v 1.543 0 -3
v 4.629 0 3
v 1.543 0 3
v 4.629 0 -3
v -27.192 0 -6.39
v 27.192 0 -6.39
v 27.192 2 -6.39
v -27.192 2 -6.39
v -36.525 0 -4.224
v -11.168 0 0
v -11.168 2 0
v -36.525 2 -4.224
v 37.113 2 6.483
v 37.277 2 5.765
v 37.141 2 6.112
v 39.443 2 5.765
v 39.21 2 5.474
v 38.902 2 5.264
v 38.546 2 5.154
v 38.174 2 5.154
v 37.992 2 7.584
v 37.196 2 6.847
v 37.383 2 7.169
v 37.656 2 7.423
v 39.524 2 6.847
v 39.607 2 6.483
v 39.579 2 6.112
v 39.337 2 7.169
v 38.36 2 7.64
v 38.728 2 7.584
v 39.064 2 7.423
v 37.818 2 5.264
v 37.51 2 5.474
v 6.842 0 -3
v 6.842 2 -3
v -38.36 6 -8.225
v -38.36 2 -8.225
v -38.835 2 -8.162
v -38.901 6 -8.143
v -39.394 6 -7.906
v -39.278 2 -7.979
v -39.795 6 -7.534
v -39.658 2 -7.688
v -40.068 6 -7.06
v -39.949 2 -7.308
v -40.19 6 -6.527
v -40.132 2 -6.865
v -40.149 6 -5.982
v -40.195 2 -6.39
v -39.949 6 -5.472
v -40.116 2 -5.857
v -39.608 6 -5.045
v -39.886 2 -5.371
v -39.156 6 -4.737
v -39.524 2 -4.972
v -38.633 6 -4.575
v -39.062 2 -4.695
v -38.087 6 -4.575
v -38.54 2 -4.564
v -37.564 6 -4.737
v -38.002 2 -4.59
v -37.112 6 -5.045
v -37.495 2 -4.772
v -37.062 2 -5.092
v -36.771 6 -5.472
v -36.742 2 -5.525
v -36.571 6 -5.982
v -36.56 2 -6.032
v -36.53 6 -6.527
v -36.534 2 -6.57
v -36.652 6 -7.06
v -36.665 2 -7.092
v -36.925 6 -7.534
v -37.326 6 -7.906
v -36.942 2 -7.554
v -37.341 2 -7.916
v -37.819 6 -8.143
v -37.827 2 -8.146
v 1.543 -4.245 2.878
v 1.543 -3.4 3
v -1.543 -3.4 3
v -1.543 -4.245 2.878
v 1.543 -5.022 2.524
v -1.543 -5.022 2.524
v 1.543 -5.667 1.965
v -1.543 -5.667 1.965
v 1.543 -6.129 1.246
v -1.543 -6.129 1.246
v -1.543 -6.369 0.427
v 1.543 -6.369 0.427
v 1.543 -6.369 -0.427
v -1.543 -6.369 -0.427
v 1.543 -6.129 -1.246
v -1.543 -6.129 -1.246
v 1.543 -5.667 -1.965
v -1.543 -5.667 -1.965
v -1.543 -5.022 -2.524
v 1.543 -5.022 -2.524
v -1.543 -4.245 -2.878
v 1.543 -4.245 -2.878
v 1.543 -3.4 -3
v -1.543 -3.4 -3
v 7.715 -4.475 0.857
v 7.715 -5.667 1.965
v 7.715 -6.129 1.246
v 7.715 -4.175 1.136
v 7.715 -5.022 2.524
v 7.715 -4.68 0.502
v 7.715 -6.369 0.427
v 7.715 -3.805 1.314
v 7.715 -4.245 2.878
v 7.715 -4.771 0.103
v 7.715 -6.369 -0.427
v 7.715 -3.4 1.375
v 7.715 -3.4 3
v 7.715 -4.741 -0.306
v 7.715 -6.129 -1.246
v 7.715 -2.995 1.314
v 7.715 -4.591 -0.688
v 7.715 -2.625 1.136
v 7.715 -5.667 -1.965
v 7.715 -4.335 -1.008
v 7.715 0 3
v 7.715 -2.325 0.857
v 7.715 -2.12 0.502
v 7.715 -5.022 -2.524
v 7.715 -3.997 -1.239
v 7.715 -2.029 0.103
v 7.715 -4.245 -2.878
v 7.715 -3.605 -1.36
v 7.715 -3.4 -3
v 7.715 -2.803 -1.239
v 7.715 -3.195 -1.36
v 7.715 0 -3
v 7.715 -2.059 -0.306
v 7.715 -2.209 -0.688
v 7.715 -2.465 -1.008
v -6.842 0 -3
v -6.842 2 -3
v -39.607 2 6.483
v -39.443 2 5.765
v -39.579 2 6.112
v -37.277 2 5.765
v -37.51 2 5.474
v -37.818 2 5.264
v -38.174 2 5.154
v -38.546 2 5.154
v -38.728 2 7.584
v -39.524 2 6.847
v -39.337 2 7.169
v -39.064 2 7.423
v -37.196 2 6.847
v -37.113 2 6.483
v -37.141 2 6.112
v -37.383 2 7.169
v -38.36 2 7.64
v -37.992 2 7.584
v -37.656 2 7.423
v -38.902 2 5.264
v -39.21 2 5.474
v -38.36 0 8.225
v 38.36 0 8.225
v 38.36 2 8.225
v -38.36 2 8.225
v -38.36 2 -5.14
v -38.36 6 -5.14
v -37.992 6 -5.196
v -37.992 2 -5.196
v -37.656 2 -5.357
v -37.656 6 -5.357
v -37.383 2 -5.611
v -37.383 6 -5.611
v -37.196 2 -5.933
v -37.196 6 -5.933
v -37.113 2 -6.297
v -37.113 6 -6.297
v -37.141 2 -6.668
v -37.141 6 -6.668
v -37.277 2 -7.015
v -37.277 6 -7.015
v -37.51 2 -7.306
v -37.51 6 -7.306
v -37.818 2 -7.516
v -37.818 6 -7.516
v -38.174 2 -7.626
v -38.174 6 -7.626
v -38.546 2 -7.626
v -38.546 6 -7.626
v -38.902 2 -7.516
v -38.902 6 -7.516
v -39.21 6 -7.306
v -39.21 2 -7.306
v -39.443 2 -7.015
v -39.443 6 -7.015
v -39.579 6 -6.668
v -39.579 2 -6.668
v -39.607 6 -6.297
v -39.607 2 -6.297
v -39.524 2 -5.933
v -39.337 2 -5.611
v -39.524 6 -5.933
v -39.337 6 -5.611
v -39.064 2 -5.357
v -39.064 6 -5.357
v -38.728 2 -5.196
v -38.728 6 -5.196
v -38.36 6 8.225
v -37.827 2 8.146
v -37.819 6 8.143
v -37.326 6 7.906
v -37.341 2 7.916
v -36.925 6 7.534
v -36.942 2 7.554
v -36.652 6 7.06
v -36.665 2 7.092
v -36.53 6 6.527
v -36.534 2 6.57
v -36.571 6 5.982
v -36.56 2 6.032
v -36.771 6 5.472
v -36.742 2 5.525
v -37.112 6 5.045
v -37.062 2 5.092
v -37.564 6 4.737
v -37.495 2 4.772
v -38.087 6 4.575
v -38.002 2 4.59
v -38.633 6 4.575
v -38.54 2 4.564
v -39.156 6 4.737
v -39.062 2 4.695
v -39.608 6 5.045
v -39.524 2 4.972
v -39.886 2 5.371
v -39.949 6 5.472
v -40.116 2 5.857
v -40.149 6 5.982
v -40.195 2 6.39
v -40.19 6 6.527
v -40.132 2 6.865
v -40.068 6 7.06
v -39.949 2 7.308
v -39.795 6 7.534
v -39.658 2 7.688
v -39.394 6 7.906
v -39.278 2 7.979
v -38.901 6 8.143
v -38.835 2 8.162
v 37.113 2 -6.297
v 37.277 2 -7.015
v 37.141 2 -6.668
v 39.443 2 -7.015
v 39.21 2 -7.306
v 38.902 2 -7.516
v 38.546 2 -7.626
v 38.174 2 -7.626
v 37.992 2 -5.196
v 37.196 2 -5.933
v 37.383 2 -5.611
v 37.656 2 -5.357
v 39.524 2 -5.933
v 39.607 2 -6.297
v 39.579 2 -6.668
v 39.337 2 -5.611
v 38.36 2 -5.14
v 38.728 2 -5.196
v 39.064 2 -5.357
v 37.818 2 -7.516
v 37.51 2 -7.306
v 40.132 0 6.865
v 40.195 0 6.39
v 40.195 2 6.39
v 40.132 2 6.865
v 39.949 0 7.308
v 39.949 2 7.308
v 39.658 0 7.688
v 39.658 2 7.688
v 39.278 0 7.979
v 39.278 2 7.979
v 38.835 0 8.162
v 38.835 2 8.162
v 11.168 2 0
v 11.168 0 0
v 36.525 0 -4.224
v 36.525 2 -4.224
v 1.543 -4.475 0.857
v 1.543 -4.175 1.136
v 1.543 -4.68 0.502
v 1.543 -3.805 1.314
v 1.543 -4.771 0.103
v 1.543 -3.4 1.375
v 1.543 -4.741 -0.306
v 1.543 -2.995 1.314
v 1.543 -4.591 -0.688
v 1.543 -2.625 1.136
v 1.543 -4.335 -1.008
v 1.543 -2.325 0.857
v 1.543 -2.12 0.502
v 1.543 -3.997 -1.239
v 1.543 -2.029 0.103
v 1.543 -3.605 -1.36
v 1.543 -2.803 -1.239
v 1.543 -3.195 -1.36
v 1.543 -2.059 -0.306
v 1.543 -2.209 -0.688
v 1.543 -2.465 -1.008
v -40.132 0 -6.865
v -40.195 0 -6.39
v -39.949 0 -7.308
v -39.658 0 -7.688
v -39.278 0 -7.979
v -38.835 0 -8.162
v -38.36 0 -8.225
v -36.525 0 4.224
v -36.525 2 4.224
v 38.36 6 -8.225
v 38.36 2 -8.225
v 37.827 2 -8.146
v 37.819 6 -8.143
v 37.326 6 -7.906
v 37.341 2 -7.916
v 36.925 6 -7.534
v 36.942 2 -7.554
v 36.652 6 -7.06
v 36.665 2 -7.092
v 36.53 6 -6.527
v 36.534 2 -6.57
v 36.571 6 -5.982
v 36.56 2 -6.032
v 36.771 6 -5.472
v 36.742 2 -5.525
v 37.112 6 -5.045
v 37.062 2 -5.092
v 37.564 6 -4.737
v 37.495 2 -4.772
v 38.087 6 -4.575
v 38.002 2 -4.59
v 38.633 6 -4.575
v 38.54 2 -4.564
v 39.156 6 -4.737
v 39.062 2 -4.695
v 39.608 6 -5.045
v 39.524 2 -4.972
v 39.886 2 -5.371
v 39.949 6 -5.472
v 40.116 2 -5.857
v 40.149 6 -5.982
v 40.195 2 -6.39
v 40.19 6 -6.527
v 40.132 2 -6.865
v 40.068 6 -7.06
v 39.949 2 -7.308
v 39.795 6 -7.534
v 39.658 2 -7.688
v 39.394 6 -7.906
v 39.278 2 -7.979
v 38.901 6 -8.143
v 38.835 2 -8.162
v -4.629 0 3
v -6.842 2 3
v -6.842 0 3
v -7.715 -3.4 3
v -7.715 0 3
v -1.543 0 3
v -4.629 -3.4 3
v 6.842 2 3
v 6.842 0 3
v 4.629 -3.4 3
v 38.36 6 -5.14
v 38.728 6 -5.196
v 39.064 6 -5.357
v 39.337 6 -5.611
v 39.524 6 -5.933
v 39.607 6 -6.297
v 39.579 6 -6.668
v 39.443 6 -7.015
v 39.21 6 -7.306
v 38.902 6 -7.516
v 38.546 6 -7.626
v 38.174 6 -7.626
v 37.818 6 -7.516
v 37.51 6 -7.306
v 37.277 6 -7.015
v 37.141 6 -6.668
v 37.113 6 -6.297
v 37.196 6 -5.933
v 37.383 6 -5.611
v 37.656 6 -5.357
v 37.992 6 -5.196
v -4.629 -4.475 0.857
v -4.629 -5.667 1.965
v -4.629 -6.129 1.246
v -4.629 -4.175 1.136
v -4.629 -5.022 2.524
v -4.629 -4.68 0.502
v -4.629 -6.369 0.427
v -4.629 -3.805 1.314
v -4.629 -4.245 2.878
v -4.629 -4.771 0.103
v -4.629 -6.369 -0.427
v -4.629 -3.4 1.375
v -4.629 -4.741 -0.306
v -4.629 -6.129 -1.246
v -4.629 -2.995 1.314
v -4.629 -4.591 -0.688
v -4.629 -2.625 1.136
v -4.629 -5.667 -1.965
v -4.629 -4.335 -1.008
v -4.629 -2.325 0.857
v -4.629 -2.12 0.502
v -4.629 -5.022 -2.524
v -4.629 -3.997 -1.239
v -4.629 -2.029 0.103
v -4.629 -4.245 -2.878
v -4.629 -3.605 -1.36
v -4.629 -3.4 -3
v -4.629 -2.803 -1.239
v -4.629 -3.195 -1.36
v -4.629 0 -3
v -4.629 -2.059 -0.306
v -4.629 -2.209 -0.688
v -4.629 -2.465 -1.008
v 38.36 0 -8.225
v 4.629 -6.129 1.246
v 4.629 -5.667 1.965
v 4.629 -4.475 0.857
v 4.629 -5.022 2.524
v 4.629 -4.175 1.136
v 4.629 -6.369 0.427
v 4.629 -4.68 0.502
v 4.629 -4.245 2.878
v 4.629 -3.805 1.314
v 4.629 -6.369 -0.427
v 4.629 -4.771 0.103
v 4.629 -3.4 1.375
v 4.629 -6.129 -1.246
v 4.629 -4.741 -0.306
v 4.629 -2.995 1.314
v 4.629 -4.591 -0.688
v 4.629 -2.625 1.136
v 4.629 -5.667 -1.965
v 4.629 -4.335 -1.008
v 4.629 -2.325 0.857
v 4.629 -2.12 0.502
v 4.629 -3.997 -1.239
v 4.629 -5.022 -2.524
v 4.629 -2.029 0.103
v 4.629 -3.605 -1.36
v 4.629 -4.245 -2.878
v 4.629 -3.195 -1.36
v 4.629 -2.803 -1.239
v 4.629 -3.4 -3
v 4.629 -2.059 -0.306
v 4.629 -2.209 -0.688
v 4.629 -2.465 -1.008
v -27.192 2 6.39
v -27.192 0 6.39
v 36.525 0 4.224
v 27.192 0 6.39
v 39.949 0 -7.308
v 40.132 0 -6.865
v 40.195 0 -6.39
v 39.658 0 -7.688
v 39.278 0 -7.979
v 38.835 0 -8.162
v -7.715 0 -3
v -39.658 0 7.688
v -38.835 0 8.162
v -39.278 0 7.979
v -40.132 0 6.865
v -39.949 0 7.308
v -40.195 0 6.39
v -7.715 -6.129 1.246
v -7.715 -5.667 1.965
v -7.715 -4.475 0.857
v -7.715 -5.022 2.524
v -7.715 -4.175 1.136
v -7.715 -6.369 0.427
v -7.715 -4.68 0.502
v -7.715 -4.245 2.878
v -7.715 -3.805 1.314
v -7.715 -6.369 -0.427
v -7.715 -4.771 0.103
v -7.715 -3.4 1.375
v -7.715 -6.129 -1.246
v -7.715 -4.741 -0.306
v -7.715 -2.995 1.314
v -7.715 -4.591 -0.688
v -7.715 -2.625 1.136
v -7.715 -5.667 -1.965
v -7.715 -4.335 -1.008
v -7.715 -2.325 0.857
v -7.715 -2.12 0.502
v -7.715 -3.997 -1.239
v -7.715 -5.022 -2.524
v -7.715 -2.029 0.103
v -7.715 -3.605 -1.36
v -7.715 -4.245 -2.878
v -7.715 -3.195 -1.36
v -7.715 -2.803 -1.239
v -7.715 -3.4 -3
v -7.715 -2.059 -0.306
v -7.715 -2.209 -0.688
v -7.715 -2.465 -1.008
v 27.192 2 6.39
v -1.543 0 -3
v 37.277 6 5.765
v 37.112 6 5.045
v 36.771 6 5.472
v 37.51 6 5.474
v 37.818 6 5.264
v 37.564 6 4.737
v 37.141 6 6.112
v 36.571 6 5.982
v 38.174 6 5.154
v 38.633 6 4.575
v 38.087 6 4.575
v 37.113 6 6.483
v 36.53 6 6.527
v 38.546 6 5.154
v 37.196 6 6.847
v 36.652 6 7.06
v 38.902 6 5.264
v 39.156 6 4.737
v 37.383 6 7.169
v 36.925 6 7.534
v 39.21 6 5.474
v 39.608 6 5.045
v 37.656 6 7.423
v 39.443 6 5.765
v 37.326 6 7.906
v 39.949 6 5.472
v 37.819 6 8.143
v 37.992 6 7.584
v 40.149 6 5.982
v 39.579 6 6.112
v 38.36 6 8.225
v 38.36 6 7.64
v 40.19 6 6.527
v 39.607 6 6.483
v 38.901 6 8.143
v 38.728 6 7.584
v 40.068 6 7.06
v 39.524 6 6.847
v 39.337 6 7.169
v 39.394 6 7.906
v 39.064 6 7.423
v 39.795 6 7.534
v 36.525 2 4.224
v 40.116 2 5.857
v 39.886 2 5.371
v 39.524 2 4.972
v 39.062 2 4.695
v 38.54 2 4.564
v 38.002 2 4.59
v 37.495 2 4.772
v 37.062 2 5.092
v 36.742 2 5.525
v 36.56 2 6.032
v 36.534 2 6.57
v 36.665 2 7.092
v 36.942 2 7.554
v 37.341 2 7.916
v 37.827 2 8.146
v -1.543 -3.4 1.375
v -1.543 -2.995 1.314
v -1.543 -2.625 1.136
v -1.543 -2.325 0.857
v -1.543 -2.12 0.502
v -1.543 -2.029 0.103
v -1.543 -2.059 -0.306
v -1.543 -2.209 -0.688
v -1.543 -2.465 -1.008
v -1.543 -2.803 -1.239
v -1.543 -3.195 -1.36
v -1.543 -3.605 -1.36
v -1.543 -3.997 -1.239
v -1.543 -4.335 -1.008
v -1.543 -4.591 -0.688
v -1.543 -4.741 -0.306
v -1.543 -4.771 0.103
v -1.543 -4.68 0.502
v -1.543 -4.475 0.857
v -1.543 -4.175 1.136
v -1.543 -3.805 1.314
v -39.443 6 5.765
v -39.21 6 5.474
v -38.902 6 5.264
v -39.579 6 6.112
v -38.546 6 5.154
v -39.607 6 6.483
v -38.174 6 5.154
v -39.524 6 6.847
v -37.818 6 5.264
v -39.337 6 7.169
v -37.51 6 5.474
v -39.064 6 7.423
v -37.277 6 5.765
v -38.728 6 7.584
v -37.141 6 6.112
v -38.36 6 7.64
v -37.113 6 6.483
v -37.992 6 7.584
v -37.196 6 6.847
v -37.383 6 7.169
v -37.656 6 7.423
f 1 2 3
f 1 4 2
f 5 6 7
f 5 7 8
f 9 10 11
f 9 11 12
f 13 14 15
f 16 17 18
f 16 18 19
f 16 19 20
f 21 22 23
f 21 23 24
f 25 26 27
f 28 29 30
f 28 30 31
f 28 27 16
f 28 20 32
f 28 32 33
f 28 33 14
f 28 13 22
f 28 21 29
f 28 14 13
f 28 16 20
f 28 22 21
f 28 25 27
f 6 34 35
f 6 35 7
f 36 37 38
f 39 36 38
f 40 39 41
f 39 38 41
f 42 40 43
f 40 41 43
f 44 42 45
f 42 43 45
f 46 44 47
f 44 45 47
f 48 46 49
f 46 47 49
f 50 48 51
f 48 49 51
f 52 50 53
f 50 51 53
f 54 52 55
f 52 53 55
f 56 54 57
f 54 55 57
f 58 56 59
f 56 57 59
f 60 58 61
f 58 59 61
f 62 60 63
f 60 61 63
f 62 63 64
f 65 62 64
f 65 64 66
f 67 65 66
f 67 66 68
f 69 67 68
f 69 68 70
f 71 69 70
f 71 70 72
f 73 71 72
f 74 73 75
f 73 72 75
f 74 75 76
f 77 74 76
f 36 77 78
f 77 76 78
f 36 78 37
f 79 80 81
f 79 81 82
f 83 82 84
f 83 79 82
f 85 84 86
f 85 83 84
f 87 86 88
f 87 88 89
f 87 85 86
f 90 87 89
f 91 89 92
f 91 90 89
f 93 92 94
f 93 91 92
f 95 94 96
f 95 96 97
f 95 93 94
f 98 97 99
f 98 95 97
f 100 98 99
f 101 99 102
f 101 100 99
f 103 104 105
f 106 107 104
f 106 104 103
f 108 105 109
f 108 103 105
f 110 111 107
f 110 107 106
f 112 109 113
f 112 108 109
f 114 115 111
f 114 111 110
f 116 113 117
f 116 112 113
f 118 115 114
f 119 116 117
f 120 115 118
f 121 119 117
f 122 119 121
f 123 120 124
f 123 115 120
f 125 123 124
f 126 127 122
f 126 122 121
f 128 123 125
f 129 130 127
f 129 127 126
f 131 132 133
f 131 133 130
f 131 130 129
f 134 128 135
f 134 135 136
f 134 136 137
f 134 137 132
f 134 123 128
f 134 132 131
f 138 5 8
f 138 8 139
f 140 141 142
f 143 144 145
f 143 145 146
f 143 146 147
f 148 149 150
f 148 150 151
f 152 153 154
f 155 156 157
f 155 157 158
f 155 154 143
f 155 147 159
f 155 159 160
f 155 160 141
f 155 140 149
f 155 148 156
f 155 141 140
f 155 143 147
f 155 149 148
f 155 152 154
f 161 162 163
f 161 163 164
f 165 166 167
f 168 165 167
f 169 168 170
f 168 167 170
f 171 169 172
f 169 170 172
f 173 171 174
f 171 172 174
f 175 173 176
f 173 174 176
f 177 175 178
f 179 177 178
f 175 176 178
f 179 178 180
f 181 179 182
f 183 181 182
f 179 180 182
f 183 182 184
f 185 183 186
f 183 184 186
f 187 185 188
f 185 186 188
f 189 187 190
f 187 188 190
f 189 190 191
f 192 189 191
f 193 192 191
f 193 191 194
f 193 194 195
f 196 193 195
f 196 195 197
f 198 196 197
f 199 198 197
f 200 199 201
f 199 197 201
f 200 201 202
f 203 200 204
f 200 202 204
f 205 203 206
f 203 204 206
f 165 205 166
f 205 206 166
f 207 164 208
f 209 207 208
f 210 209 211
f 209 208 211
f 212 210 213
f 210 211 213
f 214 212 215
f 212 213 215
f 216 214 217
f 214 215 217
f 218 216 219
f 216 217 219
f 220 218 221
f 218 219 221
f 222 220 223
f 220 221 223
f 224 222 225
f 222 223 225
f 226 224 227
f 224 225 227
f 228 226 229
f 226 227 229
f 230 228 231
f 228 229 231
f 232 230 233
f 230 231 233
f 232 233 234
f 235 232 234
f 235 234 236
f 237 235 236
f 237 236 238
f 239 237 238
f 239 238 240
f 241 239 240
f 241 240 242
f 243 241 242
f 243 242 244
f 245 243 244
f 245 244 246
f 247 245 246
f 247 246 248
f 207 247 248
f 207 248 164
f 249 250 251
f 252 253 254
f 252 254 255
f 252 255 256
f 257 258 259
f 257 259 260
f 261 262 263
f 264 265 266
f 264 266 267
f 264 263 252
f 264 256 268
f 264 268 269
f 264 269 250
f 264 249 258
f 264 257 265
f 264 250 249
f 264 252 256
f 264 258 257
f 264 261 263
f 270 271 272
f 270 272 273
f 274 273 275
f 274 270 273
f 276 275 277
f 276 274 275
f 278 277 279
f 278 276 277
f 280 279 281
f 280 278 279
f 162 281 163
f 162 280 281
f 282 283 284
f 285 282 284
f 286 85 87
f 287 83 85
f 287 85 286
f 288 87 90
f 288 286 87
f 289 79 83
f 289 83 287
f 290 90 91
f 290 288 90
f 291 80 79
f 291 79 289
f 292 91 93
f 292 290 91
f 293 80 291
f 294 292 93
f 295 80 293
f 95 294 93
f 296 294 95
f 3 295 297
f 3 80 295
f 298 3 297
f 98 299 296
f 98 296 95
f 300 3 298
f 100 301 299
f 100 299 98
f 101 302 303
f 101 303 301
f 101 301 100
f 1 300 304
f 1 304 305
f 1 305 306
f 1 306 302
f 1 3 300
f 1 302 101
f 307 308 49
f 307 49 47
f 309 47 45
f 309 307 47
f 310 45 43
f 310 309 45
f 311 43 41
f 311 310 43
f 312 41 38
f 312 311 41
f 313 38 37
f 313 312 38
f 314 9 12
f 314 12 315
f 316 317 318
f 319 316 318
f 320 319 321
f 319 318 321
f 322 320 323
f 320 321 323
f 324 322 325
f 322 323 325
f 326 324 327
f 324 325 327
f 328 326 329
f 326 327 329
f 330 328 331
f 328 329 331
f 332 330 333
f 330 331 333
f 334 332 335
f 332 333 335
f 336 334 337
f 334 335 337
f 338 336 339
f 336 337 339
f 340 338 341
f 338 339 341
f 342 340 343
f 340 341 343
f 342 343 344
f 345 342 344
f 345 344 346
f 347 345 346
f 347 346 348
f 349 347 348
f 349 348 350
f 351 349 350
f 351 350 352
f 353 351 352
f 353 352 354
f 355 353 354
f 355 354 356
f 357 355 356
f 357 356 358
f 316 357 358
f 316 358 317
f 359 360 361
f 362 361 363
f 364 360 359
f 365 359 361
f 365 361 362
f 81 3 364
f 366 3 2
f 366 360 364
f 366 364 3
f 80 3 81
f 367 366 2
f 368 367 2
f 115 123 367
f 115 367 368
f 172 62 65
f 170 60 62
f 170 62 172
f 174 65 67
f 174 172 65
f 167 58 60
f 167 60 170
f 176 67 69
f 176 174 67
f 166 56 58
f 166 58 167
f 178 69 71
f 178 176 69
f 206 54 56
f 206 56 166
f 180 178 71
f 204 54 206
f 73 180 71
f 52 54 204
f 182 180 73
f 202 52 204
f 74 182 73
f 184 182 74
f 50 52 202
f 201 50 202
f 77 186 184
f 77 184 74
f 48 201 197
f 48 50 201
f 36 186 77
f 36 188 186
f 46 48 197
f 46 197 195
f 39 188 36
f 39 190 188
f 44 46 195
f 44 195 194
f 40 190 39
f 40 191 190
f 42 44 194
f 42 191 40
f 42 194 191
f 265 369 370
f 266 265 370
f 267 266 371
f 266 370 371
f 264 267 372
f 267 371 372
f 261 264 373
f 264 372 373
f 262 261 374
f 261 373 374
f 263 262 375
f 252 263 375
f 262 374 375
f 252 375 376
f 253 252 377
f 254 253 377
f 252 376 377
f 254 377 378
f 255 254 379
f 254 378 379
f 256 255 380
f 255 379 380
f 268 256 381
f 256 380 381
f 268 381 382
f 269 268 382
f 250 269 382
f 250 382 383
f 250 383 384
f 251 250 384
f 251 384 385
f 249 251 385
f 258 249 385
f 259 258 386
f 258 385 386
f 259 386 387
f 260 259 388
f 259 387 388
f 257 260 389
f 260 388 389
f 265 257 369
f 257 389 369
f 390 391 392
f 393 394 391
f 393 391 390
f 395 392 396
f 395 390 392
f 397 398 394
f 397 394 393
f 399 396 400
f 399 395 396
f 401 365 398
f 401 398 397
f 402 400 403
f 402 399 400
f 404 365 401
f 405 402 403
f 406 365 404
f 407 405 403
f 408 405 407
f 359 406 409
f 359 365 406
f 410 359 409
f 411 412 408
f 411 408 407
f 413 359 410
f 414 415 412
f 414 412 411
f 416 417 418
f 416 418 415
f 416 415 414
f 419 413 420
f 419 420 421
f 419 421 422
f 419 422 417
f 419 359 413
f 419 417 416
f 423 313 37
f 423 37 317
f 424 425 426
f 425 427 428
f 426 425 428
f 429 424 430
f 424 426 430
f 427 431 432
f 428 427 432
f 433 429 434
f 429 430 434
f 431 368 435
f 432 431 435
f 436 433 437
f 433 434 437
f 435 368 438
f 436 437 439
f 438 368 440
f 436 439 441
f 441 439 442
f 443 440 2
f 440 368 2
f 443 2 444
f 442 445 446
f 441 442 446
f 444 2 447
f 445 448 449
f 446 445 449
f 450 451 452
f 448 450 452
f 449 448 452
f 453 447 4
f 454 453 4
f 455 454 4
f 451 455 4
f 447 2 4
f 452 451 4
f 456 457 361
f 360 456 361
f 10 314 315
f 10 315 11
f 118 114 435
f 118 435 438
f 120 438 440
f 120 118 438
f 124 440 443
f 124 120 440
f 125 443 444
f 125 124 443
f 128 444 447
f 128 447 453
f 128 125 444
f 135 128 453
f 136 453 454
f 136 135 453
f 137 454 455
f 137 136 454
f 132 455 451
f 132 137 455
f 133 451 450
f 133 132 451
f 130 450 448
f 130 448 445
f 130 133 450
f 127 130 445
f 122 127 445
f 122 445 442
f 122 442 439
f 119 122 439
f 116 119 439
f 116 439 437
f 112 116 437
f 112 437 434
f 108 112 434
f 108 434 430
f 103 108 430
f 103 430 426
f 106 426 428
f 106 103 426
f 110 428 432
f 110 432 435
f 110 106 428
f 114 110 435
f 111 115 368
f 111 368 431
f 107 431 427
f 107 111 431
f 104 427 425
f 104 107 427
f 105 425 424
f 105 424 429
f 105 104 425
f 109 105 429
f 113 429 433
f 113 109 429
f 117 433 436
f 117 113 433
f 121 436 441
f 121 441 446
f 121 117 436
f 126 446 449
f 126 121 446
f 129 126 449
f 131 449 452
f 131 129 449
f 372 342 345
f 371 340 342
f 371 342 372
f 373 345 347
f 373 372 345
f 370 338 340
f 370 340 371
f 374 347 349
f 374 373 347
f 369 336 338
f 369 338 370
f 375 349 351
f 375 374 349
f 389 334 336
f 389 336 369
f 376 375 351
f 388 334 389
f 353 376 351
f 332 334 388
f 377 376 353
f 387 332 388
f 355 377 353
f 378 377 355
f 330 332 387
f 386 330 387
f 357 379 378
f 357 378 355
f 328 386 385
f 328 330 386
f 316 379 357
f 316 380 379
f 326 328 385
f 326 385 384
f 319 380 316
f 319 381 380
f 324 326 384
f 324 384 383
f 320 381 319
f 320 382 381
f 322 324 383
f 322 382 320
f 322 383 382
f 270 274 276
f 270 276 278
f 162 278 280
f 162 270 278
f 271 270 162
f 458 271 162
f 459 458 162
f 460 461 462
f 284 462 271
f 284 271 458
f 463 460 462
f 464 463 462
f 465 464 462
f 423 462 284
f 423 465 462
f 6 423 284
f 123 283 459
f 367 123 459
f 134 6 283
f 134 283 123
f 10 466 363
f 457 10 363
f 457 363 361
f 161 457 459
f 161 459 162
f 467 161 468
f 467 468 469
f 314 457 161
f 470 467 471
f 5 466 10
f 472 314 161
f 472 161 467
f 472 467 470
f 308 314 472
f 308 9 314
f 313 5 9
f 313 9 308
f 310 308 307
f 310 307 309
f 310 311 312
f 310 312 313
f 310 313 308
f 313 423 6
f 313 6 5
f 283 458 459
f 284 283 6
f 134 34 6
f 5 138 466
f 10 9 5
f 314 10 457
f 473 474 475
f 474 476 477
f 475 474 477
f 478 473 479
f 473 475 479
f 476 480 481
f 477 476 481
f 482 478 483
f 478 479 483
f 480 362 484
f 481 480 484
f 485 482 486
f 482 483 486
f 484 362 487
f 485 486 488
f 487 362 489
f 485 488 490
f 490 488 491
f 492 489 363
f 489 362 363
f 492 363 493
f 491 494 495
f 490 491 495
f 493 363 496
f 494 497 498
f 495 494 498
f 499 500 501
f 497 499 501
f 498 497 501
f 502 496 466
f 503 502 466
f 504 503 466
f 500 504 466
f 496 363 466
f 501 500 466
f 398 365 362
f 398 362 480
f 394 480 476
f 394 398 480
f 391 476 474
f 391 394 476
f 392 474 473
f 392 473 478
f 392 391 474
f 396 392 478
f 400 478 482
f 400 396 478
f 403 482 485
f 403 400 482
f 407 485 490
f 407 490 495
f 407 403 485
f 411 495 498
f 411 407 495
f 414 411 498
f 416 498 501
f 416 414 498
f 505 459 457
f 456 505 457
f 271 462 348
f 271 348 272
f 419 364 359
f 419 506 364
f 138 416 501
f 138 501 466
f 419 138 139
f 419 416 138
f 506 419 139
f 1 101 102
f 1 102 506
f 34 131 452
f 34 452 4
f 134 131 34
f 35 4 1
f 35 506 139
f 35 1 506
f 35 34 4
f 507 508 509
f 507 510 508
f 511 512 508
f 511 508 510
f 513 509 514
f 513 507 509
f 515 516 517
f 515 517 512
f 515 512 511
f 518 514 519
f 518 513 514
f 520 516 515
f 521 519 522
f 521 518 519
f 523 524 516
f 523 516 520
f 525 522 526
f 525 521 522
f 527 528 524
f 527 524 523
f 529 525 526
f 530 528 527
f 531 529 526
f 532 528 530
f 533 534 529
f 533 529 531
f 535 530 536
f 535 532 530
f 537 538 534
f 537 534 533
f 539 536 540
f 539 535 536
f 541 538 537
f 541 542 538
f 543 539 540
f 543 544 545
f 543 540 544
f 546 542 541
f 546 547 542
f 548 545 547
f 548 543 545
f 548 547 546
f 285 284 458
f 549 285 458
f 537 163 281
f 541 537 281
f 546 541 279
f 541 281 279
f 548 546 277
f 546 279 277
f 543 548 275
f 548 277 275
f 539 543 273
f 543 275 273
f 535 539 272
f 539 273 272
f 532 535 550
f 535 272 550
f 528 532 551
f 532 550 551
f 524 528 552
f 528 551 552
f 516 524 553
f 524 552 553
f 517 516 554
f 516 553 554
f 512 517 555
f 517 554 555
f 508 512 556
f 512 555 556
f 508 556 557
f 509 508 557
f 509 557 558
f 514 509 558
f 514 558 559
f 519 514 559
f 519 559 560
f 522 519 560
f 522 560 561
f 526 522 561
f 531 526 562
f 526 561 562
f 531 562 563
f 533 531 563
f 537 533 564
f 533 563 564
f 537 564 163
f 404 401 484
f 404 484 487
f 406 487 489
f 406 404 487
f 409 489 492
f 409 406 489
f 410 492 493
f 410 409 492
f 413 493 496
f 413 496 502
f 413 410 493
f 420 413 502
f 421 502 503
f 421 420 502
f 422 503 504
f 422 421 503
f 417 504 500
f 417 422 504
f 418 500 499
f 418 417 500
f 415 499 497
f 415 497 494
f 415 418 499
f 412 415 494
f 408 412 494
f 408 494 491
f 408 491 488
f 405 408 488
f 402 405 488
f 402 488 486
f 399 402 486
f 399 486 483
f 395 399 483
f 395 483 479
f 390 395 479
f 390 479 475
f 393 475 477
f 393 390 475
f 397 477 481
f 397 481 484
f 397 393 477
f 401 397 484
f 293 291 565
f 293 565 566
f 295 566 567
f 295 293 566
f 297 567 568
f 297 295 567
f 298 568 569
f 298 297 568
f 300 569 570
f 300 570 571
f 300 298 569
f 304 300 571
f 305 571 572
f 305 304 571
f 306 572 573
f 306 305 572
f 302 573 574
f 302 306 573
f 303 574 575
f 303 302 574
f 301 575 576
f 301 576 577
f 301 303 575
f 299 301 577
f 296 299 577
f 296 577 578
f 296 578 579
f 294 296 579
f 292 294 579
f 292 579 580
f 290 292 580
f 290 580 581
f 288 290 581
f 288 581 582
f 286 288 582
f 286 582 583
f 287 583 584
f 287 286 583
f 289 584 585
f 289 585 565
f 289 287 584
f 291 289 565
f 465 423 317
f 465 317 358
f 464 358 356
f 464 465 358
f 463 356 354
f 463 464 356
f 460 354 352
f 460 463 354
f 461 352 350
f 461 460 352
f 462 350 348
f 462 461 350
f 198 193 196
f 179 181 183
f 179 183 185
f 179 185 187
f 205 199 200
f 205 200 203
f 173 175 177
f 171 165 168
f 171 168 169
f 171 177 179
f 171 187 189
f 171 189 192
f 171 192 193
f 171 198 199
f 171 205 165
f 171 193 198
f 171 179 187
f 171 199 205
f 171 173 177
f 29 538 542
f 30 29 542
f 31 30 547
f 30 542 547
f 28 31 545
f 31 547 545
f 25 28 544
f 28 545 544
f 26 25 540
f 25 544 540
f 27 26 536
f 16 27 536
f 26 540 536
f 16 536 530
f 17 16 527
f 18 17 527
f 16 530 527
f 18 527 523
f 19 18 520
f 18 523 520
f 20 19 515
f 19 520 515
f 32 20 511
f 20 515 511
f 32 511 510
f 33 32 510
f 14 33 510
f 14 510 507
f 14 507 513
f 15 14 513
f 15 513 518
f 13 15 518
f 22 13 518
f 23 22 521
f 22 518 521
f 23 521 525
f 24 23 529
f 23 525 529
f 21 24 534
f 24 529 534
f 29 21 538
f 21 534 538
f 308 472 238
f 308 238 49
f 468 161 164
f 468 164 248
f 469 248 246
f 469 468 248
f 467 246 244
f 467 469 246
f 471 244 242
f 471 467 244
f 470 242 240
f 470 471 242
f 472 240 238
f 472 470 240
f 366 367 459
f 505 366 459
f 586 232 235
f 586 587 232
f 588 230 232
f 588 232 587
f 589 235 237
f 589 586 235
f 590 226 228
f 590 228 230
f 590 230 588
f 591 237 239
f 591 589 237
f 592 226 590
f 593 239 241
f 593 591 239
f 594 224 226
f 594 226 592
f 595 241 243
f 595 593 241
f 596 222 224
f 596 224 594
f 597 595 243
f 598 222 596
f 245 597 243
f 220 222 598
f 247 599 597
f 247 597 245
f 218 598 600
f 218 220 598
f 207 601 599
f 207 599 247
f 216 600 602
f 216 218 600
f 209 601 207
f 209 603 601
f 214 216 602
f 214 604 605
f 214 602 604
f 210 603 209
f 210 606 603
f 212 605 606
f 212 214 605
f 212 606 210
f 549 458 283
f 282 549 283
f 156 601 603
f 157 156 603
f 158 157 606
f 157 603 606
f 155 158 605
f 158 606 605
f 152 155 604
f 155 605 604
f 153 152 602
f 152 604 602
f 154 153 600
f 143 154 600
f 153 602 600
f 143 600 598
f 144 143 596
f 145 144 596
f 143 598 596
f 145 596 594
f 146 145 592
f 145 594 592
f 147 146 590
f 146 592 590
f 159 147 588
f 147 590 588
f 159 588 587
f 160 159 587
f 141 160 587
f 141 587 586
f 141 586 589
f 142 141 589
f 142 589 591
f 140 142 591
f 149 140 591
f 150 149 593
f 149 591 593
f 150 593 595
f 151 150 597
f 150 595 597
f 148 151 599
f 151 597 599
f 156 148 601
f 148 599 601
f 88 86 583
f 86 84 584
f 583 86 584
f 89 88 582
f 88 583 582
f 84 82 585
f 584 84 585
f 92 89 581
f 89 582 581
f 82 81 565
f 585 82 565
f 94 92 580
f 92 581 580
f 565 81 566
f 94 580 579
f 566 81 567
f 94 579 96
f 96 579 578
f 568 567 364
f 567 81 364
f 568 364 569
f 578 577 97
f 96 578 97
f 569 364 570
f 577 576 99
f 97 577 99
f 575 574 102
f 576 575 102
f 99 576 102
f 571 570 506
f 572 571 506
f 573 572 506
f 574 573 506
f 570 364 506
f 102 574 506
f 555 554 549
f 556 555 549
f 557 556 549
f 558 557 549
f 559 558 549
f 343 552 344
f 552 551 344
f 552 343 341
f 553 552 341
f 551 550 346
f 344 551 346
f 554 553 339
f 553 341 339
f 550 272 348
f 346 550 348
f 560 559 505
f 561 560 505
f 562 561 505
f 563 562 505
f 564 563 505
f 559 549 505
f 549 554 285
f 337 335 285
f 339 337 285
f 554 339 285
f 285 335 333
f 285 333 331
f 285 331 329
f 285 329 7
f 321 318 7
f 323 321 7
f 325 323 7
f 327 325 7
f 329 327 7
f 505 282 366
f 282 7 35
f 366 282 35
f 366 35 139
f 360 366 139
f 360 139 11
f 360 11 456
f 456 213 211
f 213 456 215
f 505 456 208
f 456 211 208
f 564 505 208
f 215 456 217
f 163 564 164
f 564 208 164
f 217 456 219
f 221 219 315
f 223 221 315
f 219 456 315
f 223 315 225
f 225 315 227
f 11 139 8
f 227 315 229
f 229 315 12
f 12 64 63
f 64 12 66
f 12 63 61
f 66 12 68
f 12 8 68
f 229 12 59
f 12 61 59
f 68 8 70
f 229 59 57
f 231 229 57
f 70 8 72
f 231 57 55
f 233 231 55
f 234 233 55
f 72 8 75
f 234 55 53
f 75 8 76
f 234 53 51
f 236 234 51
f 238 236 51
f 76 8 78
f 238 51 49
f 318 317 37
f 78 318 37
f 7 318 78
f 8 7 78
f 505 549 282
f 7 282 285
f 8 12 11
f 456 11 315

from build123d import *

# Parameters (mm, degrees)
BOSS_EXTRUDE2_DEPTH = 2
SKETCH4_R           = 1.835
BOSS_EXTRUDE3_DEPTH = 4
SKETCH6_R           = 1.25
CUT_EXTRUDE1_DEPTH  = 4
SKETCH7_R           = 1.375
BOSS_EXTRUDE4_DEPTH = 3.086
LPATTERN1_COUNT     = 3
LPATTERN1_PITCH     = 6.172


with BuildPart() as part:
    # Sketch3 → Boss-Extrude2 (new body)
    with BuildSketch(Plane(origin=(0, 0, 0), x_dir=(1, 0, 0), z_dir=(0, 1, 0))):
        with BuildLine():
            Line((38.36, -8.225), (-38.36, -8.225))
            ThreePointArc((-38.36, -8.225), (-39.657541, -7.687541), (-40.195, -6.39))
            Line((-40.195, -6.39), (-40.195, 6.39))
            ThreePointArc((-40.195, 6.39), (-39.657541, 7.687541), (-38.36, 8.225))
            Line((-38.36, 8.225), (38.36, 8.225))
            ThreePointArc((38.36, 8.225), (39.657541, 7.687541), (40.195, 6.39))
            Line((40.195, 6.39), (40.195, -6.39))
            ThreePointArc((40.195, -6.39), (39.657541, -7.687541), (38.36, -8.225))
        make_face()
        Polygon((6.841855, -3), (27.192466, -6.39), (-27.192466, -6.39), (-6.841855, -3), align=None, mode=Mode.SUBTRACT)
        Polygon((-27.192466, 6.39), (-6.841855, 3), (6.841855, 3), (27.192466, 6.39), align=None, mode=Mode.SUBTRACT)
        Polygon((-36.525, 4.224041), (-36.525, -4.224041), (-11.167534, 0), align=None, mode=Mode.SUBTRACT)
        Polygon((36.525, -4.224041), (11.167534, 0), (36.525, 4.224041), align=None, mode=Mode.SUBTRACT)
    extrude(amount=BOSS_EXTRUDE2_DEPTH)

    # Sketch4 → Boss-Extrude3 (add)
    with BuildSketch(Plane(origin=(0, 2, 0), x_dir=(1, 0, 0), z_dir=(0, 1, 0))):
        with Locations(Location((-38.36, 6.39, 0), (0, 0, 90))):
            Circle(SKETCH4_R)
        with Locations(Location((-38.36, -6.39, 0), (0, 0, 270))):
            Circle(SKETCH4_R)
        with Locations(Location((38.36, 6.39, 0), (0, 0, 90))):
            Circle(SKETCH4_R)
        with Locations(Location((38.36, -6.39, 0), (0, 0, 270))):
            Circle(SKETCH4_R)
    extrude(amount=BOSS_EXTRUDE3_DEPTH)

    # Sketch6 → Cut-Extrude1 (cut)
    with BuildSketch(Plane(origin=(0, 6, 0), x_dir=(1, 0, 0), z_dir=(0, 1, 0))):
        with Locations(Location((-38.36, 6.39, 0), (0, 0, 270))):
            Circle(SKETCH6_R)
        with Locations(Location((-38.36, -6.39, 0), (0, 0, 270))):
            Circle(SKETCH6_R)
        with Locations(Location((38.36, 6.39, 0), (0, 0, 270))):
            Circle(SKETCH6_R)
        with Locations(Location((38.36, -6.39, 0), (0, 0, 270))):
            Circle(SKETCH6_R)
    extrude(amount=-CUT_EXTRUDE1_DEPTH, mode=Mode.SUBTRACT)

    # Sketch7 → Boss-Extrude4 (add)
    with BuildSketch(Plane.ZY.offset(-7.715)):
        with BuildLine():
            Line((-3, 0), (3, 0))
            Line((3, 0), (3, -3.4))
            ThreePointArc((3, -3.4), (0, -6.4), (-3, -3.4))
            Line((-3, -3.4), (-3, 0))
        make_face()
        with Locations((0, -3.4)):
            Circle(SKETCH7_R, mode=Mode.SUBTRACT)
    boss_extrude4 = extrude(amount=BOSS_EXTRUDE4_DEPTH)

    # LPattern1: Boss-Extrude4 ×3
    with Locations(*[(-i * LPATTERN1_PITCH, 0, 0) for i in range(1, LPATTERN1_COUNT)]):
        add(boss_extrude4)


solid = part.part
